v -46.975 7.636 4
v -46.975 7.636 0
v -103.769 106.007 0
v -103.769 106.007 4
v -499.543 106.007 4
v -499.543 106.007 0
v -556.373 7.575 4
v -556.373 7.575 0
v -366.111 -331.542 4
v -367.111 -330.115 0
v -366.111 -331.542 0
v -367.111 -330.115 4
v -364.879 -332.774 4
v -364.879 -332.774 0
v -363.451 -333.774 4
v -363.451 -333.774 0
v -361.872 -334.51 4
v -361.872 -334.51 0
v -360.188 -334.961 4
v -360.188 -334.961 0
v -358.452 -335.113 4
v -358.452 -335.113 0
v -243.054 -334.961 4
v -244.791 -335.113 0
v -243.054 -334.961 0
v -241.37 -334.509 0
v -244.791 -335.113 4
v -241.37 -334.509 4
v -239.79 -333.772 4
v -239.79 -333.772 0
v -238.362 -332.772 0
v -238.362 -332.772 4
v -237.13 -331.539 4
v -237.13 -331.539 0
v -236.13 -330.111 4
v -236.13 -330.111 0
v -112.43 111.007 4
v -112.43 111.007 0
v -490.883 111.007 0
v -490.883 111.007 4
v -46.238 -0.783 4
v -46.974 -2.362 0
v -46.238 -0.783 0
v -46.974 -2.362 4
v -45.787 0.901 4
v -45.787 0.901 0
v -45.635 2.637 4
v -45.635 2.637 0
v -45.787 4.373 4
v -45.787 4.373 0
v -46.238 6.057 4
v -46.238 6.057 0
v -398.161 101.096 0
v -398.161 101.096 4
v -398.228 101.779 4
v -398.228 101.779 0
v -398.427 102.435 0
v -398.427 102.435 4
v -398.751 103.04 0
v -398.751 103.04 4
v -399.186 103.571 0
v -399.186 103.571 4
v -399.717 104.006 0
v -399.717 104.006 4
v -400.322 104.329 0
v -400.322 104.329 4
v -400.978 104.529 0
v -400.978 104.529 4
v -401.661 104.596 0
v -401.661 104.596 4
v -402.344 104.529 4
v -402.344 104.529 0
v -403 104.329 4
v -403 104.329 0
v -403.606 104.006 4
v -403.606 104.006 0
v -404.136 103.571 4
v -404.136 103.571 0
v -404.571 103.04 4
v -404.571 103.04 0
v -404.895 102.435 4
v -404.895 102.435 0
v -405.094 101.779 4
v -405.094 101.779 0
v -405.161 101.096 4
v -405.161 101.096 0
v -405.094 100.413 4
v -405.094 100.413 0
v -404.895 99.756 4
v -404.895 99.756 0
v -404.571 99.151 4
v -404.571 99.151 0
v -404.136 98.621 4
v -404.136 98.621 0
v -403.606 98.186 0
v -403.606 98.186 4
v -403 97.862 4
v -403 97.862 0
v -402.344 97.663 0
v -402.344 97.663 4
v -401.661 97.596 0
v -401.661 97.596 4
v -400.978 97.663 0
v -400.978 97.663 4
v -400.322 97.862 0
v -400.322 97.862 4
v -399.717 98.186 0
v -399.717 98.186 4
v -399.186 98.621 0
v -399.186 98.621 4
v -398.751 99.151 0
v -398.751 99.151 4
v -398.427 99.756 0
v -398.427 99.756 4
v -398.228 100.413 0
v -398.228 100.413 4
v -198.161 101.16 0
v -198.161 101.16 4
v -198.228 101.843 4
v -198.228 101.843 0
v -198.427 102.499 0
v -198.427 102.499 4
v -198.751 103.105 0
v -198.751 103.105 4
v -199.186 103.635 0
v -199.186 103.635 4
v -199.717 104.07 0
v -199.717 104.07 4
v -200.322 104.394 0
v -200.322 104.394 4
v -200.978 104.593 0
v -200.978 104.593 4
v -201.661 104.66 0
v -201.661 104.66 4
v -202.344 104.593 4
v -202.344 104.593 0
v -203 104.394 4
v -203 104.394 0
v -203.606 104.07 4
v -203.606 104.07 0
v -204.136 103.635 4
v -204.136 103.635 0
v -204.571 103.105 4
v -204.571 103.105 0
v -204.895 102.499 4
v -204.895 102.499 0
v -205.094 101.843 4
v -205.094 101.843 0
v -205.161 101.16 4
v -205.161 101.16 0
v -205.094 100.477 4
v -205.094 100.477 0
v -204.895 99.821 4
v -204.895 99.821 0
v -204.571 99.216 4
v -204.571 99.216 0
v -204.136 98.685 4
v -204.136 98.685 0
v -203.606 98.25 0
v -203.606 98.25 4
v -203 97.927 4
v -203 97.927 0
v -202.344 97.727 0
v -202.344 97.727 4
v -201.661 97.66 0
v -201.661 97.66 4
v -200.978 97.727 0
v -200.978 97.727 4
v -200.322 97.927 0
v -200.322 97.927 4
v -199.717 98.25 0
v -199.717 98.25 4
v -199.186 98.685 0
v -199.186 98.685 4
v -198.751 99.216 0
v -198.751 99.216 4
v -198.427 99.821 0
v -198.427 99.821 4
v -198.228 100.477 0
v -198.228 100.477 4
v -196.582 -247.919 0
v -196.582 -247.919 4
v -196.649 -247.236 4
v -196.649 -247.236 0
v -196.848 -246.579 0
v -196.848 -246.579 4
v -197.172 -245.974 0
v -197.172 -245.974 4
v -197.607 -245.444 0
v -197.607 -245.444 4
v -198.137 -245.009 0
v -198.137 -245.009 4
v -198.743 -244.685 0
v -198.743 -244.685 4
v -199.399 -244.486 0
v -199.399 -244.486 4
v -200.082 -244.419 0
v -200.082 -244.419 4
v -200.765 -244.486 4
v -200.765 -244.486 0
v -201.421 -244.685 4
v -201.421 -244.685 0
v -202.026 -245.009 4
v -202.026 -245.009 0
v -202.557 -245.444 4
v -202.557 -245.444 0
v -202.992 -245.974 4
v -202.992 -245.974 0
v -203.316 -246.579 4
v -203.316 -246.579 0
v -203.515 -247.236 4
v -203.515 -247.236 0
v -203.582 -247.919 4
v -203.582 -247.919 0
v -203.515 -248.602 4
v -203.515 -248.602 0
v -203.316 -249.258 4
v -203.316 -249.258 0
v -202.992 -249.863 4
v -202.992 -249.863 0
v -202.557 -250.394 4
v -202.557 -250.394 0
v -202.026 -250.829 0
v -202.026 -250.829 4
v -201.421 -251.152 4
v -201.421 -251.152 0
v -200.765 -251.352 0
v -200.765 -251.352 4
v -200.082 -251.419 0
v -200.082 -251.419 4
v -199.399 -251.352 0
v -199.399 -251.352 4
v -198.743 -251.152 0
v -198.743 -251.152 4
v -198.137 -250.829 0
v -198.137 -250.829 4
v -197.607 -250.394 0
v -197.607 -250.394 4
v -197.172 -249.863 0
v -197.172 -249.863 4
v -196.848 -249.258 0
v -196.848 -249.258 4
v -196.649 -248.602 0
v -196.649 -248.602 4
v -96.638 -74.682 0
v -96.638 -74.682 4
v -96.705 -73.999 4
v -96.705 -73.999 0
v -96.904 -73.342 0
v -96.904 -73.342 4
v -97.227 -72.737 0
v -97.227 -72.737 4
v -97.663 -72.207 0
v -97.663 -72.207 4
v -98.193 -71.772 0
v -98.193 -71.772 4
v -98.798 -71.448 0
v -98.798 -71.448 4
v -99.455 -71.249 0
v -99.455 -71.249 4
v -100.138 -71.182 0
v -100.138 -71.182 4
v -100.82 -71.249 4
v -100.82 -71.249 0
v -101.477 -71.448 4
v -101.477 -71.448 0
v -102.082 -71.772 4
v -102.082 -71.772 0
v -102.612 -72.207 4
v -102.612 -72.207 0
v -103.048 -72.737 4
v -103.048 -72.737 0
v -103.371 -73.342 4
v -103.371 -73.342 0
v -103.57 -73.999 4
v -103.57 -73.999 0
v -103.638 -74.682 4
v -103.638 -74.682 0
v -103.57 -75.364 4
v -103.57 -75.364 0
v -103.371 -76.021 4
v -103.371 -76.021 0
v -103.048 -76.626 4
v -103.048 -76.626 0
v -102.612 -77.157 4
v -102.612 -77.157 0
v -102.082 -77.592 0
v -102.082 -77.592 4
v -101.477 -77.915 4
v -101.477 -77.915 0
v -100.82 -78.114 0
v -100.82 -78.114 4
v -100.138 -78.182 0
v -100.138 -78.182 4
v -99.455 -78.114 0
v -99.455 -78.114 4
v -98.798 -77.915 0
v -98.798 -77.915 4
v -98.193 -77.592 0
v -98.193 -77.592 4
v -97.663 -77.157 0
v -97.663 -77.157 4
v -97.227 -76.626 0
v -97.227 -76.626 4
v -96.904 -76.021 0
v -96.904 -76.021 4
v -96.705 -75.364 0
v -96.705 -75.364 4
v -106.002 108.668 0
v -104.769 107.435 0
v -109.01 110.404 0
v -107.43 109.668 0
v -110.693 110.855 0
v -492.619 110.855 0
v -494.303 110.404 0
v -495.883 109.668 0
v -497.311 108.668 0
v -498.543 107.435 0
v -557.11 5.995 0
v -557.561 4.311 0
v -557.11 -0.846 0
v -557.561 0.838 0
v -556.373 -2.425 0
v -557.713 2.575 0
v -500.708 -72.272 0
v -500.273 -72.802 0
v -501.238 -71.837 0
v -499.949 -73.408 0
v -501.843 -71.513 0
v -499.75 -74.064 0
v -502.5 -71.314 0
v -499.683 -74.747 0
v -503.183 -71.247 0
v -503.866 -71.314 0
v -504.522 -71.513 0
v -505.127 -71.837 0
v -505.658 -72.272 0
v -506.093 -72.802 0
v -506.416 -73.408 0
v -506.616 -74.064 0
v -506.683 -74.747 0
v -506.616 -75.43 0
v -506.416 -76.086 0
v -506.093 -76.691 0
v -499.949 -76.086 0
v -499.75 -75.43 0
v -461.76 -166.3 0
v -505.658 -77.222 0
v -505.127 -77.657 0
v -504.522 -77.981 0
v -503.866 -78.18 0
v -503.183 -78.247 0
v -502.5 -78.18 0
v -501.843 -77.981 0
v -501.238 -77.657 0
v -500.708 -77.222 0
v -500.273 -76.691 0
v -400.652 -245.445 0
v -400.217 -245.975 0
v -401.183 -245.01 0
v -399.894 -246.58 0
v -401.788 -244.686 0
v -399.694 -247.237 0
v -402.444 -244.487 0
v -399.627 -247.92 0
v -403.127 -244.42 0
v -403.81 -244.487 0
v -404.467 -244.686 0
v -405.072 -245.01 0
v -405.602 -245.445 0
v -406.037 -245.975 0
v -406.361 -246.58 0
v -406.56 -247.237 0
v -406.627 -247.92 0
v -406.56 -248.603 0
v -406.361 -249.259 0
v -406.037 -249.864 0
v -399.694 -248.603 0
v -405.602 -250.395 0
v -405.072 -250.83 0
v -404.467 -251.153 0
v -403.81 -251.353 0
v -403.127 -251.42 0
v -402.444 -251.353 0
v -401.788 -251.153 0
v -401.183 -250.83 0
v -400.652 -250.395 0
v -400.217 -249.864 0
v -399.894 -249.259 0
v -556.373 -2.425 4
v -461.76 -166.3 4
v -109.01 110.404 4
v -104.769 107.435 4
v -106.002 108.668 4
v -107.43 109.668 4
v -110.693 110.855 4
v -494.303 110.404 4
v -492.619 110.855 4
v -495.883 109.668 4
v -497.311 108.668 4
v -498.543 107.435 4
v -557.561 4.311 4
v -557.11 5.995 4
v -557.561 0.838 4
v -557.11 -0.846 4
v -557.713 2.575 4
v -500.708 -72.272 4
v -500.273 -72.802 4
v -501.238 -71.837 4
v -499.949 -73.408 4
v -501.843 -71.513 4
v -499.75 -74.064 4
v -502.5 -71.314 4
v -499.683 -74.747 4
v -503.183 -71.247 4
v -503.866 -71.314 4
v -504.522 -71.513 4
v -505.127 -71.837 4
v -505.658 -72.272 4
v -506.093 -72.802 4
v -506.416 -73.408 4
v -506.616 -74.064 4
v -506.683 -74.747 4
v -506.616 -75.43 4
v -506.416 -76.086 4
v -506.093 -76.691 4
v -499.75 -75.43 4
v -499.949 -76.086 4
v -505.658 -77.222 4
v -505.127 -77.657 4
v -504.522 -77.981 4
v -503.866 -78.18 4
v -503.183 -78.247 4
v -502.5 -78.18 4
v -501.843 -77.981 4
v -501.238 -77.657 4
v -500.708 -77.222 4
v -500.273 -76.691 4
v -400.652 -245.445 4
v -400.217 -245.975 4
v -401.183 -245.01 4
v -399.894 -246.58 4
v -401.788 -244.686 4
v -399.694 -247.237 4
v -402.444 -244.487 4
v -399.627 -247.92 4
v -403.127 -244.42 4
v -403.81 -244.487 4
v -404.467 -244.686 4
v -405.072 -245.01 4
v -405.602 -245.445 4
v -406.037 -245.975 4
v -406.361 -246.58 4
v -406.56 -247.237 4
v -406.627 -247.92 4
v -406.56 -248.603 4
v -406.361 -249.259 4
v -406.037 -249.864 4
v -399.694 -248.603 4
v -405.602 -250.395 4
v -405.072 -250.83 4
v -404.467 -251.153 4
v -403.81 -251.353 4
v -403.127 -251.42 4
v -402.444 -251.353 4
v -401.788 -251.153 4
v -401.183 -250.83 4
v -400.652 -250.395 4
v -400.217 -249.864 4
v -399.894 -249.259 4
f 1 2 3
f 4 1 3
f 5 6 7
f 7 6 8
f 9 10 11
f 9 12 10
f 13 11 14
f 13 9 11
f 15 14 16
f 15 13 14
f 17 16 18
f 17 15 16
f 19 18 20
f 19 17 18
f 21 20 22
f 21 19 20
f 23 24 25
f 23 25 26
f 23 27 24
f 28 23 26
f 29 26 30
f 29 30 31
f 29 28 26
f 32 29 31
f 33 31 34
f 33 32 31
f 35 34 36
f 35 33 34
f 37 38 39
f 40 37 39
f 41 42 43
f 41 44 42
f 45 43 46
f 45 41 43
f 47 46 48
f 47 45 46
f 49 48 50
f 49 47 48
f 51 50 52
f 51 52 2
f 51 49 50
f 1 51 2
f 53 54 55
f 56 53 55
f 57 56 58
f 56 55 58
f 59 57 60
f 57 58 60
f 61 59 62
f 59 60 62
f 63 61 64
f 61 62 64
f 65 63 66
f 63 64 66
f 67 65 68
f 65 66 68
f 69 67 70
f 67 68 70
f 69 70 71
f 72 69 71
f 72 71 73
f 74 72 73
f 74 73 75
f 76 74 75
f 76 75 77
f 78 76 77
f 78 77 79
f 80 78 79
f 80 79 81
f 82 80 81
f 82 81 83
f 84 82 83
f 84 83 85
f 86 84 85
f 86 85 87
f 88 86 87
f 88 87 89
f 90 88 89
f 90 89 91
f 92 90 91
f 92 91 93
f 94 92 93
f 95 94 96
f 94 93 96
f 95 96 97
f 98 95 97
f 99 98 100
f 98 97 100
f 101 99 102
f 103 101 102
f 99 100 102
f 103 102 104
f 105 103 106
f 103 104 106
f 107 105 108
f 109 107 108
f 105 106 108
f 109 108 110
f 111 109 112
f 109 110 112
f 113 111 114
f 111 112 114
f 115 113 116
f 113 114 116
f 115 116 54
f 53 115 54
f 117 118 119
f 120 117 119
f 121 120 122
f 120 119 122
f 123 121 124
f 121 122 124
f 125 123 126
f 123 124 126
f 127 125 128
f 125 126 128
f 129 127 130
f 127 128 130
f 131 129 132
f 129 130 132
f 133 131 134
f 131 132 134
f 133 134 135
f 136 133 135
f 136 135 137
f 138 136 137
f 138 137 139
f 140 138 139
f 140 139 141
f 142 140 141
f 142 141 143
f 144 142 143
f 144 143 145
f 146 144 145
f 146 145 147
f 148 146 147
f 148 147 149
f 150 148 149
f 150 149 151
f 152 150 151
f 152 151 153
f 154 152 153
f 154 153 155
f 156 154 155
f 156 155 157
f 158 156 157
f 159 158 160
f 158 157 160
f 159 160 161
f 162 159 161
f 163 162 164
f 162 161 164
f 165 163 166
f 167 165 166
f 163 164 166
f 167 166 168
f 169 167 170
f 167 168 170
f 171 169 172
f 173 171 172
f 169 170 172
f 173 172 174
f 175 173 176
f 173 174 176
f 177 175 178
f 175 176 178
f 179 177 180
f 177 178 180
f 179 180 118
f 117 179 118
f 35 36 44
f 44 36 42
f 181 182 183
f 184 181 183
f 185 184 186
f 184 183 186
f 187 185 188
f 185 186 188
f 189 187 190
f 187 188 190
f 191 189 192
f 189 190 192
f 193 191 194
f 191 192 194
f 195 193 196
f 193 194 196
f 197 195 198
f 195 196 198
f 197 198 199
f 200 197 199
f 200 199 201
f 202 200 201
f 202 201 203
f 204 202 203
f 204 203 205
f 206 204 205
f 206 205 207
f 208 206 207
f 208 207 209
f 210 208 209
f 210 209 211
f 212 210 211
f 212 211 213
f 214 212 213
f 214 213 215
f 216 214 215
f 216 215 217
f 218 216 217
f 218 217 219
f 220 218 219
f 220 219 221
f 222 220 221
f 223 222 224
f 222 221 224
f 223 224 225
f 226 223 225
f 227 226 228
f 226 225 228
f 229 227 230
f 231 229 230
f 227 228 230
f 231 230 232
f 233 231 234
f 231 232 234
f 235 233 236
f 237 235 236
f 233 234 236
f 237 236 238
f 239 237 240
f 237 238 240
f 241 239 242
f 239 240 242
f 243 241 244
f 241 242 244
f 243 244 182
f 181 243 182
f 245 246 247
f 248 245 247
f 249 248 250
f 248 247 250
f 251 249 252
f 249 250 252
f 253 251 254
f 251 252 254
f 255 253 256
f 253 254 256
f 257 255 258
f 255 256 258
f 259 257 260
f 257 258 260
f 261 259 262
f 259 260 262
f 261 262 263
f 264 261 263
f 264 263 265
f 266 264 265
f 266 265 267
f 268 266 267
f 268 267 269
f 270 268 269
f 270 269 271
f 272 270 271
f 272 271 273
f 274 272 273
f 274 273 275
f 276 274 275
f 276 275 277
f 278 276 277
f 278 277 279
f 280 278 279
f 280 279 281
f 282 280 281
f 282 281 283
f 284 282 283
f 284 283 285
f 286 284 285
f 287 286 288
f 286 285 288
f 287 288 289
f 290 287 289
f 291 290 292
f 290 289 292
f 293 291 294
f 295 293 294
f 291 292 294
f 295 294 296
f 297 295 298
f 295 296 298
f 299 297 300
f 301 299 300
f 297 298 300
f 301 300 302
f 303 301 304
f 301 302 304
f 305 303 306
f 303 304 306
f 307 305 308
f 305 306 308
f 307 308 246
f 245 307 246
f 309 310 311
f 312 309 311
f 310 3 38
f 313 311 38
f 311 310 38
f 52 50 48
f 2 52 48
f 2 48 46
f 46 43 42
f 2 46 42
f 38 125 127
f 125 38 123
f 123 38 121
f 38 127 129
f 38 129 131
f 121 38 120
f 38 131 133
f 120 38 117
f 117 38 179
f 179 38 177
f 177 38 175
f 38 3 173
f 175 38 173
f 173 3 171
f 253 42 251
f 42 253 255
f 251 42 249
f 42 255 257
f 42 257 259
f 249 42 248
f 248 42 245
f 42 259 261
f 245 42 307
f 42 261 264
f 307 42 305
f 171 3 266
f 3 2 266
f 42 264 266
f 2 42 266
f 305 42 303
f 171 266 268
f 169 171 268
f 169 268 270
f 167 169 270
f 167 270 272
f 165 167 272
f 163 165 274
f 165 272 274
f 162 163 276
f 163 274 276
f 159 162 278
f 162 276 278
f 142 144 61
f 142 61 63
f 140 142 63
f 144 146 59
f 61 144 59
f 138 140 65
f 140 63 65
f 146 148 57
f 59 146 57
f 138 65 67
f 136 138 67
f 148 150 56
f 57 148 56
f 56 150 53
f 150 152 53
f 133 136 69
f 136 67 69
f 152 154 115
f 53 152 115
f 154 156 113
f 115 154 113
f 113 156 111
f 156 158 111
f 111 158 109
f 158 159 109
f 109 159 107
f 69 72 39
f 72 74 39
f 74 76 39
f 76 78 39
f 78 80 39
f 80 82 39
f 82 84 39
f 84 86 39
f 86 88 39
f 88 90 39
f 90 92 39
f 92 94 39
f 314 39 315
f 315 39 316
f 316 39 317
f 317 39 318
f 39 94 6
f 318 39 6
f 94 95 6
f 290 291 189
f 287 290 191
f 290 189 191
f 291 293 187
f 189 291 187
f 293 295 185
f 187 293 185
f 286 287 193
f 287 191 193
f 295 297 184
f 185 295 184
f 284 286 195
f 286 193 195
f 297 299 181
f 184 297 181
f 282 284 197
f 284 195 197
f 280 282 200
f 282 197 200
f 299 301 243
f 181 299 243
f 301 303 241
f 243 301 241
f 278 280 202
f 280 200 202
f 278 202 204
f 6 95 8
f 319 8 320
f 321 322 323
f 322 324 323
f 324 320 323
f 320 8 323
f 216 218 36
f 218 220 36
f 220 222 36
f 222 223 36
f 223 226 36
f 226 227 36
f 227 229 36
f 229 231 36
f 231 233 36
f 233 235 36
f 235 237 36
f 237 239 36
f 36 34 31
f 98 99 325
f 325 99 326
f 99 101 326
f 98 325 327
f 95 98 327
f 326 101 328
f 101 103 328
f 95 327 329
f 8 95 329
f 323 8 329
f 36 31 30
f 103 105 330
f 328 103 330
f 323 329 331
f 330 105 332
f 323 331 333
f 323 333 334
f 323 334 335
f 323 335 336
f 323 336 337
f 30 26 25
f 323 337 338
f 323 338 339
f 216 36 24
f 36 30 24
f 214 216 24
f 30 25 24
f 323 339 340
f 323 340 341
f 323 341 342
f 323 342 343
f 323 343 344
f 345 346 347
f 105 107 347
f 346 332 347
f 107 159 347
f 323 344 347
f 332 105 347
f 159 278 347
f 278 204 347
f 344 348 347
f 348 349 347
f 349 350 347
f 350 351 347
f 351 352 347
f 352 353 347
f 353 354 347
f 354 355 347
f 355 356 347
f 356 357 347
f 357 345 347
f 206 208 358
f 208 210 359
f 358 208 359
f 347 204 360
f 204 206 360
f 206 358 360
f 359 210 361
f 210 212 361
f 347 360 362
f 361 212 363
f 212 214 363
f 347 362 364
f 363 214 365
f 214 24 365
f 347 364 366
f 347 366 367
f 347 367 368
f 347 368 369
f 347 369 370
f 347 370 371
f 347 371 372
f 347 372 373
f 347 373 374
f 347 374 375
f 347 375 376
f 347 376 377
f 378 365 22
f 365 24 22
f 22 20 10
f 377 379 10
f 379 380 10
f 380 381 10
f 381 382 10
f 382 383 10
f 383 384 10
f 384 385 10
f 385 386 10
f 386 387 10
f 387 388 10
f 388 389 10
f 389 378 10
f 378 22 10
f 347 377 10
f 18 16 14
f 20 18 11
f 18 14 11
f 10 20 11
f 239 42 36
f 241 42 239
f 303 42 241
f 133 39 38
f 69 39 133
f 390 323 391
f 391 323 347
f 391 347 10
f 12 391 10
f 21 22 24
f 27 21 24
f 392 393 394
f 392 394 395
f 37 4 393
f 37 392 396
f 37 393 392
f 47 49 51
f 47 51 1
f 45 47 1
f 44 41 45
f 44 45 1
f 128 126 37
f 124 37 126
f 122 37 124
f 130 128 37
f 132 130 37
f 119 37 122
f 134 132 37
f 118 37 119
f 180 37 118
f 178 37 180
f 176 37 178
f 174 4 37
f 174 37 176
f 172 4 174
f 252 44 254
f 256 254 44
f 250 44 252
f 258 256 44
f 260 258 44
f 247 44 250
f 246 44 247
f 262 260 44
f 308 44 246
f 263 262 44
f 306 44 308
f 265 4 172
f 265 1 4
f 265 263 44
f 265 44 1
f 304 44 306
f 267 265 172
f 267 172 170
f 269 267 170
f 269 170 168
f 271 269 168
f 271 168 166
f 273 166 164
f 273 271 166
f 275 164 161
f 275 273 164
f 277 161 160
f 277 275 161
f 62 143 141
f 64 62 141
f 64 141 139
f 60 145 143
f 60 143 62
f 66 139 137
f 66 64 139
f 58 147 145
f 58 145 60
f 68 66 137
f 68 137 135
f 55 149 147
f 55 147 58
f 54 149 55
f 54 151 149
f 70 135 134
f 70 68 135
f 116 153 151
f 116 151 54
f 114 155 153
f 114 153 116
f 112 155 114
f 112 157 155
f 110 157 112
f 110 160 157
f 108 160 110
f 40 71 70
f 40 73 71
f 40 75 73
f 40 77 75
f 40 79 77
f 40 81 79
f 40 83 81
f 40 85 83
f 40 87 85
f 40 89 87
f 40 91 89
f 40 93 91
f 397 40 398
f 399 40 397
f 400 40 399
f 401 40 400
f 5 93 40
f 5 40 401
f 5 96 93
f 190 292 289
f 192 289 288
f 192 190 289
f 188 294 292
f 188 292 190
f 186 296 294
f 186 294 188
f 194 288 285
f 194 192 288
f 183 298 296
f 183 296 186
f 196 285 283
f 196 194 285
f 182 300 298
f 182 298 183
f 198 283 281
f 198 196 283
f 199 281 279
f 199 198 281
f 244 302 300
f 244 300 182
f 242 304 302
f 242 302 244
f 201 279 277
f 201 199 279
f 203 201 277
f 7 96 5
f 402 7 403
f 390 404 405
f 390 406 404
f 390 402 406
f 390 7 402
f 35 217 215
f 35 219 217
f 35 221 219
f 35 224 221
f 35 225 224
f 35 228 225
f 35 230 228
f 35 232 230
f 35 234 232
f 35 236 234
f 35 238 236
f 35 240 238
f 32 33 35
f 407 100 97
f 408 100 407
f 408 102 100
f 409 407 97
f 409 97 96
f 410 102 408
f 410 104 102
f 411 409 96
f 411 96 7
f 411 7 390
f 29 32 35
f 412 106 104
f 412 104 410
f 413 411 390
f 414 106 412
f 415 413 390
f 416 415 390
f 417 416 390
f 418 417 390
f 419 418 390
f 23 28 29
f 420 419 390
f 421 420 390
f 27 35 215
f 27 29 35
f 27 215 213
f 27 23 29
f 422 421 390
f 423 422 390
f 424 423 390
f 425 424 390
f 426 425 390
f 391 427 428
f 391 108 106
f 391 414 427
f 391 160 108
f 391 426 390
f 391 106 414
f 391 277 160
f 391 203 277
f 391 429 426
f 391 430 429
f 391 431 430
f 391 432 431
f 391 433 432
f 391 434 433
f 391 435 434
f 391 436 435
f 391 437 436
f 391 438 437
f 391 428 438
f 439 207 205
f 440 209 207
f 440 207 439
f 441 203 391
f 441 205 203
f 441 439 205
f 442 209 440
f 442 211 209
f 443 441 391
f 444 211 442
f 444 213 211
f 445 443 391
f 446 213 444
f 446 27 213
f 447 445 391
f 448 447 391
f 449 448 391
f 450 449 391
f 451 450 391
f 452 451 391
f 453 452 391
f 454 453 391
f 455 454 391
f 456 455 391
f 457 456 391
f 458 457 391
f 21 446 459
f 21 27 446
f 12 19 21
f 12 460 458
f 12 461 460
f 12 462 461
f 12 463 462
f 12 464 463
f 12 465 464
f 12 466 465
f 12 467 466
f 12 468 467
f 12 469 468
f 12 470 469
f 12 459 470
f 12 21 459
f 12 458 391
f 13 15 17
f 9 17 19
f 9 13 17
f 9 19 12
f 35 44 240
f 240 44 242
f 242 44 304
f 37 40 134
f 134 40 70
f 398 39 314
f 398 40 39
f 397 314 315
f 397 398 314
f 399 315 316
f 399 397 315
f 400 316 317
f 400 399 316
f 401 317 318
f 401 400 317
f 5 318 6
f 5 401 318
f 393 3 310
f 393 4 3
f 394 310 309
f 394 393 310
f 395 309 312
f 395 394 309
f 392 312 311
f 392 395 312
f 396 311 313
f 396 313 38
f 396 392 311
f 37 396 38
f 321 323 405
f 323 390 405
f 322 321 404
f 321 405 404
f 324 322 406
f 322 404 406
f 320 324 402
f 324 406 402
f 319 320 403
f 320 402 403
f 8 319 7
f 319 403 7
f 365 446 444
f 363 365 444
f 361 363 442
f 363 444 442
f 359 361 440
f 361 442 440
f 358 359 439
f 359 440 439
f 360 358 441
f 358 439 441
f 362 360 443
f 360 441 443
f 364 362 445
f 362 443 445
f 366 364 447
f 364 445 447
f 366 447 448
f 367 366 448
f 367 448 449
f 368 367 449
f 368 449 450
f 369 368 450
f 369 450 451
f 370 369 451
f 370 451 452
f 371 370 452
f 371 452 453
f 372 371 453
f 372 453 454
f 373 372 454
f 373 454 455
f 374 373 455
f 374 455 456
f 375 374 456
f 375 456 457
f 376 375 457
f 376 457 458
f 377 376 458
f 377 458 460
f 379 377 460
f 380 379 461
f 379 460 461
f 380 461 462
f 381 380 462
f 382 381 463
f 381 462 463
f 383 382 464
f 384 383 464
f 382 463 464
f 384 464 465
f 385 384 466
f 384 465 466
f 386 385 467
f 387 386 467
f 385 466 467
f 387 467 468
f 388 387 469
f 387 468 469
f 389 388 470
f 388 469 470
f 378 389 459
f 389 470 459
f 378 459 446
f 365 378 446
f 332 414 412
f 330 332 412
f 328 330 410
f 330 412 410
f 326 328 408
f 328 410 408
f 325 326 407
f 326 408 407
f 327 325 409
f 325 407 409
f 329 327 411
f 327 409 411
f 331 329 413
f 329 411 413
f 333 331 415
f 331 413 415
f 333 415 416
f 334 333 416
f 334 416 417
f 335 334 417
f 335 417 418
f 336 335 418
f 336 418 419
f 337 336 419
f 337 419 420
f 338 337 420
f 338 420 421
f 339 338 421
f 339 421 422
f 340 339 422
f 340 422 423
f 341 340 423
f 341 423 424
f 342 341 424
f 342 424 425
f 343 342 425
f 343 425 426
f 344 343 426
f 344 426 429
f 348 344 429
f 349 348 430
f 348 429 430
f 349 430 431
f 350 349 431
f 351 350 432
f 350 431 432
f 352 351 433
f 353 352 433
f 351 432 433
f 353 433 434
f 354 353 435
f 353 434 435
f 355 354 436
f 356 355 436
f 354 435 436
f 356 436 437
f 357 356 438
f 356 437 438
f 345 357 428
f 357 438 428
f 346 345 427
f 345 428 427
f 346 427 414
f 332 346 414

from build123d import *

# Parameters (mm, degrees)
ESTRUSIONE_ESTRUSIONE1_DEPTH = 4
RACCORDO1_R                  = 10
SCHIZZO2_R                   = 3.5
TAGLIO_ESTRUSIONE1_DEPTH     = 10


with BuildPart() as part:
    # Schizzo1 → Estrusione-Estrusione1 (new body)
    with BuildSketch(Plane(origin=(0, 0, 0), x_dir=(-1, 0, 0), z_dir=(0, 0, 1))):
        Polygon((559.259871964, -2.574697247), (461.759871964, 166.300256491), (364.223704599, 335.112566514), (239.016445177, 335.112566514), (44.088779908, -2.637340962), (106.656242253, -111.007364644), (496.656242253, -111.007364644), align=None)
    extrude(amount=ESTRUSIONE_ESTRUSIONE1_DEPTH)

    # Raccordo1
    raccordo1_edges = [part.edges().sort_by_distance(p)[0] for p in [
        (-559.259871964, 2.574697247, 2),
        (-496.656242253, 111.007364644, 2),
        (-106.656242253, 111.007364644, 2),
        (-44.088779908, 2.637340962, 2),
        (-239.016445177, -335.112566514, 2),
        (-364.223704599, -335.112566514, 2),
    ]]
    fillet(raccordo1_edges, radius=RACCORDO1_R)

    # Schizzo2 → Taglio-Estrusione1 (cut)
    with BuildSketch(Plane.XY.offset(4)):
        with Locations((-503.182756728, -74.746951028)):
            Circle(SCHIZZO2_R)
        with Locations((-403.12710947, -247.919891905)):
            Circle(SCHIZZO2_R)
        with Locations((-201.661073821, 101.160104014)):
            Circle(SCHIZZO2_R)
        with Locations((-401.661063497, 101.095842135)):
            Circle(SCHIZZO2_R)
        with Locations((-200.081936903, -247.918860697)):
            Circle(SCHIZZO2_R)
        with Locations((-100.137594485, -74.681657941)):
            Circle(SCHIZZO2_R)
    extrude(amount=-TAGLIO_ESTRUSIONE1_DEPTH, mode=Mode.SUBTRACT)


solid = part.part
